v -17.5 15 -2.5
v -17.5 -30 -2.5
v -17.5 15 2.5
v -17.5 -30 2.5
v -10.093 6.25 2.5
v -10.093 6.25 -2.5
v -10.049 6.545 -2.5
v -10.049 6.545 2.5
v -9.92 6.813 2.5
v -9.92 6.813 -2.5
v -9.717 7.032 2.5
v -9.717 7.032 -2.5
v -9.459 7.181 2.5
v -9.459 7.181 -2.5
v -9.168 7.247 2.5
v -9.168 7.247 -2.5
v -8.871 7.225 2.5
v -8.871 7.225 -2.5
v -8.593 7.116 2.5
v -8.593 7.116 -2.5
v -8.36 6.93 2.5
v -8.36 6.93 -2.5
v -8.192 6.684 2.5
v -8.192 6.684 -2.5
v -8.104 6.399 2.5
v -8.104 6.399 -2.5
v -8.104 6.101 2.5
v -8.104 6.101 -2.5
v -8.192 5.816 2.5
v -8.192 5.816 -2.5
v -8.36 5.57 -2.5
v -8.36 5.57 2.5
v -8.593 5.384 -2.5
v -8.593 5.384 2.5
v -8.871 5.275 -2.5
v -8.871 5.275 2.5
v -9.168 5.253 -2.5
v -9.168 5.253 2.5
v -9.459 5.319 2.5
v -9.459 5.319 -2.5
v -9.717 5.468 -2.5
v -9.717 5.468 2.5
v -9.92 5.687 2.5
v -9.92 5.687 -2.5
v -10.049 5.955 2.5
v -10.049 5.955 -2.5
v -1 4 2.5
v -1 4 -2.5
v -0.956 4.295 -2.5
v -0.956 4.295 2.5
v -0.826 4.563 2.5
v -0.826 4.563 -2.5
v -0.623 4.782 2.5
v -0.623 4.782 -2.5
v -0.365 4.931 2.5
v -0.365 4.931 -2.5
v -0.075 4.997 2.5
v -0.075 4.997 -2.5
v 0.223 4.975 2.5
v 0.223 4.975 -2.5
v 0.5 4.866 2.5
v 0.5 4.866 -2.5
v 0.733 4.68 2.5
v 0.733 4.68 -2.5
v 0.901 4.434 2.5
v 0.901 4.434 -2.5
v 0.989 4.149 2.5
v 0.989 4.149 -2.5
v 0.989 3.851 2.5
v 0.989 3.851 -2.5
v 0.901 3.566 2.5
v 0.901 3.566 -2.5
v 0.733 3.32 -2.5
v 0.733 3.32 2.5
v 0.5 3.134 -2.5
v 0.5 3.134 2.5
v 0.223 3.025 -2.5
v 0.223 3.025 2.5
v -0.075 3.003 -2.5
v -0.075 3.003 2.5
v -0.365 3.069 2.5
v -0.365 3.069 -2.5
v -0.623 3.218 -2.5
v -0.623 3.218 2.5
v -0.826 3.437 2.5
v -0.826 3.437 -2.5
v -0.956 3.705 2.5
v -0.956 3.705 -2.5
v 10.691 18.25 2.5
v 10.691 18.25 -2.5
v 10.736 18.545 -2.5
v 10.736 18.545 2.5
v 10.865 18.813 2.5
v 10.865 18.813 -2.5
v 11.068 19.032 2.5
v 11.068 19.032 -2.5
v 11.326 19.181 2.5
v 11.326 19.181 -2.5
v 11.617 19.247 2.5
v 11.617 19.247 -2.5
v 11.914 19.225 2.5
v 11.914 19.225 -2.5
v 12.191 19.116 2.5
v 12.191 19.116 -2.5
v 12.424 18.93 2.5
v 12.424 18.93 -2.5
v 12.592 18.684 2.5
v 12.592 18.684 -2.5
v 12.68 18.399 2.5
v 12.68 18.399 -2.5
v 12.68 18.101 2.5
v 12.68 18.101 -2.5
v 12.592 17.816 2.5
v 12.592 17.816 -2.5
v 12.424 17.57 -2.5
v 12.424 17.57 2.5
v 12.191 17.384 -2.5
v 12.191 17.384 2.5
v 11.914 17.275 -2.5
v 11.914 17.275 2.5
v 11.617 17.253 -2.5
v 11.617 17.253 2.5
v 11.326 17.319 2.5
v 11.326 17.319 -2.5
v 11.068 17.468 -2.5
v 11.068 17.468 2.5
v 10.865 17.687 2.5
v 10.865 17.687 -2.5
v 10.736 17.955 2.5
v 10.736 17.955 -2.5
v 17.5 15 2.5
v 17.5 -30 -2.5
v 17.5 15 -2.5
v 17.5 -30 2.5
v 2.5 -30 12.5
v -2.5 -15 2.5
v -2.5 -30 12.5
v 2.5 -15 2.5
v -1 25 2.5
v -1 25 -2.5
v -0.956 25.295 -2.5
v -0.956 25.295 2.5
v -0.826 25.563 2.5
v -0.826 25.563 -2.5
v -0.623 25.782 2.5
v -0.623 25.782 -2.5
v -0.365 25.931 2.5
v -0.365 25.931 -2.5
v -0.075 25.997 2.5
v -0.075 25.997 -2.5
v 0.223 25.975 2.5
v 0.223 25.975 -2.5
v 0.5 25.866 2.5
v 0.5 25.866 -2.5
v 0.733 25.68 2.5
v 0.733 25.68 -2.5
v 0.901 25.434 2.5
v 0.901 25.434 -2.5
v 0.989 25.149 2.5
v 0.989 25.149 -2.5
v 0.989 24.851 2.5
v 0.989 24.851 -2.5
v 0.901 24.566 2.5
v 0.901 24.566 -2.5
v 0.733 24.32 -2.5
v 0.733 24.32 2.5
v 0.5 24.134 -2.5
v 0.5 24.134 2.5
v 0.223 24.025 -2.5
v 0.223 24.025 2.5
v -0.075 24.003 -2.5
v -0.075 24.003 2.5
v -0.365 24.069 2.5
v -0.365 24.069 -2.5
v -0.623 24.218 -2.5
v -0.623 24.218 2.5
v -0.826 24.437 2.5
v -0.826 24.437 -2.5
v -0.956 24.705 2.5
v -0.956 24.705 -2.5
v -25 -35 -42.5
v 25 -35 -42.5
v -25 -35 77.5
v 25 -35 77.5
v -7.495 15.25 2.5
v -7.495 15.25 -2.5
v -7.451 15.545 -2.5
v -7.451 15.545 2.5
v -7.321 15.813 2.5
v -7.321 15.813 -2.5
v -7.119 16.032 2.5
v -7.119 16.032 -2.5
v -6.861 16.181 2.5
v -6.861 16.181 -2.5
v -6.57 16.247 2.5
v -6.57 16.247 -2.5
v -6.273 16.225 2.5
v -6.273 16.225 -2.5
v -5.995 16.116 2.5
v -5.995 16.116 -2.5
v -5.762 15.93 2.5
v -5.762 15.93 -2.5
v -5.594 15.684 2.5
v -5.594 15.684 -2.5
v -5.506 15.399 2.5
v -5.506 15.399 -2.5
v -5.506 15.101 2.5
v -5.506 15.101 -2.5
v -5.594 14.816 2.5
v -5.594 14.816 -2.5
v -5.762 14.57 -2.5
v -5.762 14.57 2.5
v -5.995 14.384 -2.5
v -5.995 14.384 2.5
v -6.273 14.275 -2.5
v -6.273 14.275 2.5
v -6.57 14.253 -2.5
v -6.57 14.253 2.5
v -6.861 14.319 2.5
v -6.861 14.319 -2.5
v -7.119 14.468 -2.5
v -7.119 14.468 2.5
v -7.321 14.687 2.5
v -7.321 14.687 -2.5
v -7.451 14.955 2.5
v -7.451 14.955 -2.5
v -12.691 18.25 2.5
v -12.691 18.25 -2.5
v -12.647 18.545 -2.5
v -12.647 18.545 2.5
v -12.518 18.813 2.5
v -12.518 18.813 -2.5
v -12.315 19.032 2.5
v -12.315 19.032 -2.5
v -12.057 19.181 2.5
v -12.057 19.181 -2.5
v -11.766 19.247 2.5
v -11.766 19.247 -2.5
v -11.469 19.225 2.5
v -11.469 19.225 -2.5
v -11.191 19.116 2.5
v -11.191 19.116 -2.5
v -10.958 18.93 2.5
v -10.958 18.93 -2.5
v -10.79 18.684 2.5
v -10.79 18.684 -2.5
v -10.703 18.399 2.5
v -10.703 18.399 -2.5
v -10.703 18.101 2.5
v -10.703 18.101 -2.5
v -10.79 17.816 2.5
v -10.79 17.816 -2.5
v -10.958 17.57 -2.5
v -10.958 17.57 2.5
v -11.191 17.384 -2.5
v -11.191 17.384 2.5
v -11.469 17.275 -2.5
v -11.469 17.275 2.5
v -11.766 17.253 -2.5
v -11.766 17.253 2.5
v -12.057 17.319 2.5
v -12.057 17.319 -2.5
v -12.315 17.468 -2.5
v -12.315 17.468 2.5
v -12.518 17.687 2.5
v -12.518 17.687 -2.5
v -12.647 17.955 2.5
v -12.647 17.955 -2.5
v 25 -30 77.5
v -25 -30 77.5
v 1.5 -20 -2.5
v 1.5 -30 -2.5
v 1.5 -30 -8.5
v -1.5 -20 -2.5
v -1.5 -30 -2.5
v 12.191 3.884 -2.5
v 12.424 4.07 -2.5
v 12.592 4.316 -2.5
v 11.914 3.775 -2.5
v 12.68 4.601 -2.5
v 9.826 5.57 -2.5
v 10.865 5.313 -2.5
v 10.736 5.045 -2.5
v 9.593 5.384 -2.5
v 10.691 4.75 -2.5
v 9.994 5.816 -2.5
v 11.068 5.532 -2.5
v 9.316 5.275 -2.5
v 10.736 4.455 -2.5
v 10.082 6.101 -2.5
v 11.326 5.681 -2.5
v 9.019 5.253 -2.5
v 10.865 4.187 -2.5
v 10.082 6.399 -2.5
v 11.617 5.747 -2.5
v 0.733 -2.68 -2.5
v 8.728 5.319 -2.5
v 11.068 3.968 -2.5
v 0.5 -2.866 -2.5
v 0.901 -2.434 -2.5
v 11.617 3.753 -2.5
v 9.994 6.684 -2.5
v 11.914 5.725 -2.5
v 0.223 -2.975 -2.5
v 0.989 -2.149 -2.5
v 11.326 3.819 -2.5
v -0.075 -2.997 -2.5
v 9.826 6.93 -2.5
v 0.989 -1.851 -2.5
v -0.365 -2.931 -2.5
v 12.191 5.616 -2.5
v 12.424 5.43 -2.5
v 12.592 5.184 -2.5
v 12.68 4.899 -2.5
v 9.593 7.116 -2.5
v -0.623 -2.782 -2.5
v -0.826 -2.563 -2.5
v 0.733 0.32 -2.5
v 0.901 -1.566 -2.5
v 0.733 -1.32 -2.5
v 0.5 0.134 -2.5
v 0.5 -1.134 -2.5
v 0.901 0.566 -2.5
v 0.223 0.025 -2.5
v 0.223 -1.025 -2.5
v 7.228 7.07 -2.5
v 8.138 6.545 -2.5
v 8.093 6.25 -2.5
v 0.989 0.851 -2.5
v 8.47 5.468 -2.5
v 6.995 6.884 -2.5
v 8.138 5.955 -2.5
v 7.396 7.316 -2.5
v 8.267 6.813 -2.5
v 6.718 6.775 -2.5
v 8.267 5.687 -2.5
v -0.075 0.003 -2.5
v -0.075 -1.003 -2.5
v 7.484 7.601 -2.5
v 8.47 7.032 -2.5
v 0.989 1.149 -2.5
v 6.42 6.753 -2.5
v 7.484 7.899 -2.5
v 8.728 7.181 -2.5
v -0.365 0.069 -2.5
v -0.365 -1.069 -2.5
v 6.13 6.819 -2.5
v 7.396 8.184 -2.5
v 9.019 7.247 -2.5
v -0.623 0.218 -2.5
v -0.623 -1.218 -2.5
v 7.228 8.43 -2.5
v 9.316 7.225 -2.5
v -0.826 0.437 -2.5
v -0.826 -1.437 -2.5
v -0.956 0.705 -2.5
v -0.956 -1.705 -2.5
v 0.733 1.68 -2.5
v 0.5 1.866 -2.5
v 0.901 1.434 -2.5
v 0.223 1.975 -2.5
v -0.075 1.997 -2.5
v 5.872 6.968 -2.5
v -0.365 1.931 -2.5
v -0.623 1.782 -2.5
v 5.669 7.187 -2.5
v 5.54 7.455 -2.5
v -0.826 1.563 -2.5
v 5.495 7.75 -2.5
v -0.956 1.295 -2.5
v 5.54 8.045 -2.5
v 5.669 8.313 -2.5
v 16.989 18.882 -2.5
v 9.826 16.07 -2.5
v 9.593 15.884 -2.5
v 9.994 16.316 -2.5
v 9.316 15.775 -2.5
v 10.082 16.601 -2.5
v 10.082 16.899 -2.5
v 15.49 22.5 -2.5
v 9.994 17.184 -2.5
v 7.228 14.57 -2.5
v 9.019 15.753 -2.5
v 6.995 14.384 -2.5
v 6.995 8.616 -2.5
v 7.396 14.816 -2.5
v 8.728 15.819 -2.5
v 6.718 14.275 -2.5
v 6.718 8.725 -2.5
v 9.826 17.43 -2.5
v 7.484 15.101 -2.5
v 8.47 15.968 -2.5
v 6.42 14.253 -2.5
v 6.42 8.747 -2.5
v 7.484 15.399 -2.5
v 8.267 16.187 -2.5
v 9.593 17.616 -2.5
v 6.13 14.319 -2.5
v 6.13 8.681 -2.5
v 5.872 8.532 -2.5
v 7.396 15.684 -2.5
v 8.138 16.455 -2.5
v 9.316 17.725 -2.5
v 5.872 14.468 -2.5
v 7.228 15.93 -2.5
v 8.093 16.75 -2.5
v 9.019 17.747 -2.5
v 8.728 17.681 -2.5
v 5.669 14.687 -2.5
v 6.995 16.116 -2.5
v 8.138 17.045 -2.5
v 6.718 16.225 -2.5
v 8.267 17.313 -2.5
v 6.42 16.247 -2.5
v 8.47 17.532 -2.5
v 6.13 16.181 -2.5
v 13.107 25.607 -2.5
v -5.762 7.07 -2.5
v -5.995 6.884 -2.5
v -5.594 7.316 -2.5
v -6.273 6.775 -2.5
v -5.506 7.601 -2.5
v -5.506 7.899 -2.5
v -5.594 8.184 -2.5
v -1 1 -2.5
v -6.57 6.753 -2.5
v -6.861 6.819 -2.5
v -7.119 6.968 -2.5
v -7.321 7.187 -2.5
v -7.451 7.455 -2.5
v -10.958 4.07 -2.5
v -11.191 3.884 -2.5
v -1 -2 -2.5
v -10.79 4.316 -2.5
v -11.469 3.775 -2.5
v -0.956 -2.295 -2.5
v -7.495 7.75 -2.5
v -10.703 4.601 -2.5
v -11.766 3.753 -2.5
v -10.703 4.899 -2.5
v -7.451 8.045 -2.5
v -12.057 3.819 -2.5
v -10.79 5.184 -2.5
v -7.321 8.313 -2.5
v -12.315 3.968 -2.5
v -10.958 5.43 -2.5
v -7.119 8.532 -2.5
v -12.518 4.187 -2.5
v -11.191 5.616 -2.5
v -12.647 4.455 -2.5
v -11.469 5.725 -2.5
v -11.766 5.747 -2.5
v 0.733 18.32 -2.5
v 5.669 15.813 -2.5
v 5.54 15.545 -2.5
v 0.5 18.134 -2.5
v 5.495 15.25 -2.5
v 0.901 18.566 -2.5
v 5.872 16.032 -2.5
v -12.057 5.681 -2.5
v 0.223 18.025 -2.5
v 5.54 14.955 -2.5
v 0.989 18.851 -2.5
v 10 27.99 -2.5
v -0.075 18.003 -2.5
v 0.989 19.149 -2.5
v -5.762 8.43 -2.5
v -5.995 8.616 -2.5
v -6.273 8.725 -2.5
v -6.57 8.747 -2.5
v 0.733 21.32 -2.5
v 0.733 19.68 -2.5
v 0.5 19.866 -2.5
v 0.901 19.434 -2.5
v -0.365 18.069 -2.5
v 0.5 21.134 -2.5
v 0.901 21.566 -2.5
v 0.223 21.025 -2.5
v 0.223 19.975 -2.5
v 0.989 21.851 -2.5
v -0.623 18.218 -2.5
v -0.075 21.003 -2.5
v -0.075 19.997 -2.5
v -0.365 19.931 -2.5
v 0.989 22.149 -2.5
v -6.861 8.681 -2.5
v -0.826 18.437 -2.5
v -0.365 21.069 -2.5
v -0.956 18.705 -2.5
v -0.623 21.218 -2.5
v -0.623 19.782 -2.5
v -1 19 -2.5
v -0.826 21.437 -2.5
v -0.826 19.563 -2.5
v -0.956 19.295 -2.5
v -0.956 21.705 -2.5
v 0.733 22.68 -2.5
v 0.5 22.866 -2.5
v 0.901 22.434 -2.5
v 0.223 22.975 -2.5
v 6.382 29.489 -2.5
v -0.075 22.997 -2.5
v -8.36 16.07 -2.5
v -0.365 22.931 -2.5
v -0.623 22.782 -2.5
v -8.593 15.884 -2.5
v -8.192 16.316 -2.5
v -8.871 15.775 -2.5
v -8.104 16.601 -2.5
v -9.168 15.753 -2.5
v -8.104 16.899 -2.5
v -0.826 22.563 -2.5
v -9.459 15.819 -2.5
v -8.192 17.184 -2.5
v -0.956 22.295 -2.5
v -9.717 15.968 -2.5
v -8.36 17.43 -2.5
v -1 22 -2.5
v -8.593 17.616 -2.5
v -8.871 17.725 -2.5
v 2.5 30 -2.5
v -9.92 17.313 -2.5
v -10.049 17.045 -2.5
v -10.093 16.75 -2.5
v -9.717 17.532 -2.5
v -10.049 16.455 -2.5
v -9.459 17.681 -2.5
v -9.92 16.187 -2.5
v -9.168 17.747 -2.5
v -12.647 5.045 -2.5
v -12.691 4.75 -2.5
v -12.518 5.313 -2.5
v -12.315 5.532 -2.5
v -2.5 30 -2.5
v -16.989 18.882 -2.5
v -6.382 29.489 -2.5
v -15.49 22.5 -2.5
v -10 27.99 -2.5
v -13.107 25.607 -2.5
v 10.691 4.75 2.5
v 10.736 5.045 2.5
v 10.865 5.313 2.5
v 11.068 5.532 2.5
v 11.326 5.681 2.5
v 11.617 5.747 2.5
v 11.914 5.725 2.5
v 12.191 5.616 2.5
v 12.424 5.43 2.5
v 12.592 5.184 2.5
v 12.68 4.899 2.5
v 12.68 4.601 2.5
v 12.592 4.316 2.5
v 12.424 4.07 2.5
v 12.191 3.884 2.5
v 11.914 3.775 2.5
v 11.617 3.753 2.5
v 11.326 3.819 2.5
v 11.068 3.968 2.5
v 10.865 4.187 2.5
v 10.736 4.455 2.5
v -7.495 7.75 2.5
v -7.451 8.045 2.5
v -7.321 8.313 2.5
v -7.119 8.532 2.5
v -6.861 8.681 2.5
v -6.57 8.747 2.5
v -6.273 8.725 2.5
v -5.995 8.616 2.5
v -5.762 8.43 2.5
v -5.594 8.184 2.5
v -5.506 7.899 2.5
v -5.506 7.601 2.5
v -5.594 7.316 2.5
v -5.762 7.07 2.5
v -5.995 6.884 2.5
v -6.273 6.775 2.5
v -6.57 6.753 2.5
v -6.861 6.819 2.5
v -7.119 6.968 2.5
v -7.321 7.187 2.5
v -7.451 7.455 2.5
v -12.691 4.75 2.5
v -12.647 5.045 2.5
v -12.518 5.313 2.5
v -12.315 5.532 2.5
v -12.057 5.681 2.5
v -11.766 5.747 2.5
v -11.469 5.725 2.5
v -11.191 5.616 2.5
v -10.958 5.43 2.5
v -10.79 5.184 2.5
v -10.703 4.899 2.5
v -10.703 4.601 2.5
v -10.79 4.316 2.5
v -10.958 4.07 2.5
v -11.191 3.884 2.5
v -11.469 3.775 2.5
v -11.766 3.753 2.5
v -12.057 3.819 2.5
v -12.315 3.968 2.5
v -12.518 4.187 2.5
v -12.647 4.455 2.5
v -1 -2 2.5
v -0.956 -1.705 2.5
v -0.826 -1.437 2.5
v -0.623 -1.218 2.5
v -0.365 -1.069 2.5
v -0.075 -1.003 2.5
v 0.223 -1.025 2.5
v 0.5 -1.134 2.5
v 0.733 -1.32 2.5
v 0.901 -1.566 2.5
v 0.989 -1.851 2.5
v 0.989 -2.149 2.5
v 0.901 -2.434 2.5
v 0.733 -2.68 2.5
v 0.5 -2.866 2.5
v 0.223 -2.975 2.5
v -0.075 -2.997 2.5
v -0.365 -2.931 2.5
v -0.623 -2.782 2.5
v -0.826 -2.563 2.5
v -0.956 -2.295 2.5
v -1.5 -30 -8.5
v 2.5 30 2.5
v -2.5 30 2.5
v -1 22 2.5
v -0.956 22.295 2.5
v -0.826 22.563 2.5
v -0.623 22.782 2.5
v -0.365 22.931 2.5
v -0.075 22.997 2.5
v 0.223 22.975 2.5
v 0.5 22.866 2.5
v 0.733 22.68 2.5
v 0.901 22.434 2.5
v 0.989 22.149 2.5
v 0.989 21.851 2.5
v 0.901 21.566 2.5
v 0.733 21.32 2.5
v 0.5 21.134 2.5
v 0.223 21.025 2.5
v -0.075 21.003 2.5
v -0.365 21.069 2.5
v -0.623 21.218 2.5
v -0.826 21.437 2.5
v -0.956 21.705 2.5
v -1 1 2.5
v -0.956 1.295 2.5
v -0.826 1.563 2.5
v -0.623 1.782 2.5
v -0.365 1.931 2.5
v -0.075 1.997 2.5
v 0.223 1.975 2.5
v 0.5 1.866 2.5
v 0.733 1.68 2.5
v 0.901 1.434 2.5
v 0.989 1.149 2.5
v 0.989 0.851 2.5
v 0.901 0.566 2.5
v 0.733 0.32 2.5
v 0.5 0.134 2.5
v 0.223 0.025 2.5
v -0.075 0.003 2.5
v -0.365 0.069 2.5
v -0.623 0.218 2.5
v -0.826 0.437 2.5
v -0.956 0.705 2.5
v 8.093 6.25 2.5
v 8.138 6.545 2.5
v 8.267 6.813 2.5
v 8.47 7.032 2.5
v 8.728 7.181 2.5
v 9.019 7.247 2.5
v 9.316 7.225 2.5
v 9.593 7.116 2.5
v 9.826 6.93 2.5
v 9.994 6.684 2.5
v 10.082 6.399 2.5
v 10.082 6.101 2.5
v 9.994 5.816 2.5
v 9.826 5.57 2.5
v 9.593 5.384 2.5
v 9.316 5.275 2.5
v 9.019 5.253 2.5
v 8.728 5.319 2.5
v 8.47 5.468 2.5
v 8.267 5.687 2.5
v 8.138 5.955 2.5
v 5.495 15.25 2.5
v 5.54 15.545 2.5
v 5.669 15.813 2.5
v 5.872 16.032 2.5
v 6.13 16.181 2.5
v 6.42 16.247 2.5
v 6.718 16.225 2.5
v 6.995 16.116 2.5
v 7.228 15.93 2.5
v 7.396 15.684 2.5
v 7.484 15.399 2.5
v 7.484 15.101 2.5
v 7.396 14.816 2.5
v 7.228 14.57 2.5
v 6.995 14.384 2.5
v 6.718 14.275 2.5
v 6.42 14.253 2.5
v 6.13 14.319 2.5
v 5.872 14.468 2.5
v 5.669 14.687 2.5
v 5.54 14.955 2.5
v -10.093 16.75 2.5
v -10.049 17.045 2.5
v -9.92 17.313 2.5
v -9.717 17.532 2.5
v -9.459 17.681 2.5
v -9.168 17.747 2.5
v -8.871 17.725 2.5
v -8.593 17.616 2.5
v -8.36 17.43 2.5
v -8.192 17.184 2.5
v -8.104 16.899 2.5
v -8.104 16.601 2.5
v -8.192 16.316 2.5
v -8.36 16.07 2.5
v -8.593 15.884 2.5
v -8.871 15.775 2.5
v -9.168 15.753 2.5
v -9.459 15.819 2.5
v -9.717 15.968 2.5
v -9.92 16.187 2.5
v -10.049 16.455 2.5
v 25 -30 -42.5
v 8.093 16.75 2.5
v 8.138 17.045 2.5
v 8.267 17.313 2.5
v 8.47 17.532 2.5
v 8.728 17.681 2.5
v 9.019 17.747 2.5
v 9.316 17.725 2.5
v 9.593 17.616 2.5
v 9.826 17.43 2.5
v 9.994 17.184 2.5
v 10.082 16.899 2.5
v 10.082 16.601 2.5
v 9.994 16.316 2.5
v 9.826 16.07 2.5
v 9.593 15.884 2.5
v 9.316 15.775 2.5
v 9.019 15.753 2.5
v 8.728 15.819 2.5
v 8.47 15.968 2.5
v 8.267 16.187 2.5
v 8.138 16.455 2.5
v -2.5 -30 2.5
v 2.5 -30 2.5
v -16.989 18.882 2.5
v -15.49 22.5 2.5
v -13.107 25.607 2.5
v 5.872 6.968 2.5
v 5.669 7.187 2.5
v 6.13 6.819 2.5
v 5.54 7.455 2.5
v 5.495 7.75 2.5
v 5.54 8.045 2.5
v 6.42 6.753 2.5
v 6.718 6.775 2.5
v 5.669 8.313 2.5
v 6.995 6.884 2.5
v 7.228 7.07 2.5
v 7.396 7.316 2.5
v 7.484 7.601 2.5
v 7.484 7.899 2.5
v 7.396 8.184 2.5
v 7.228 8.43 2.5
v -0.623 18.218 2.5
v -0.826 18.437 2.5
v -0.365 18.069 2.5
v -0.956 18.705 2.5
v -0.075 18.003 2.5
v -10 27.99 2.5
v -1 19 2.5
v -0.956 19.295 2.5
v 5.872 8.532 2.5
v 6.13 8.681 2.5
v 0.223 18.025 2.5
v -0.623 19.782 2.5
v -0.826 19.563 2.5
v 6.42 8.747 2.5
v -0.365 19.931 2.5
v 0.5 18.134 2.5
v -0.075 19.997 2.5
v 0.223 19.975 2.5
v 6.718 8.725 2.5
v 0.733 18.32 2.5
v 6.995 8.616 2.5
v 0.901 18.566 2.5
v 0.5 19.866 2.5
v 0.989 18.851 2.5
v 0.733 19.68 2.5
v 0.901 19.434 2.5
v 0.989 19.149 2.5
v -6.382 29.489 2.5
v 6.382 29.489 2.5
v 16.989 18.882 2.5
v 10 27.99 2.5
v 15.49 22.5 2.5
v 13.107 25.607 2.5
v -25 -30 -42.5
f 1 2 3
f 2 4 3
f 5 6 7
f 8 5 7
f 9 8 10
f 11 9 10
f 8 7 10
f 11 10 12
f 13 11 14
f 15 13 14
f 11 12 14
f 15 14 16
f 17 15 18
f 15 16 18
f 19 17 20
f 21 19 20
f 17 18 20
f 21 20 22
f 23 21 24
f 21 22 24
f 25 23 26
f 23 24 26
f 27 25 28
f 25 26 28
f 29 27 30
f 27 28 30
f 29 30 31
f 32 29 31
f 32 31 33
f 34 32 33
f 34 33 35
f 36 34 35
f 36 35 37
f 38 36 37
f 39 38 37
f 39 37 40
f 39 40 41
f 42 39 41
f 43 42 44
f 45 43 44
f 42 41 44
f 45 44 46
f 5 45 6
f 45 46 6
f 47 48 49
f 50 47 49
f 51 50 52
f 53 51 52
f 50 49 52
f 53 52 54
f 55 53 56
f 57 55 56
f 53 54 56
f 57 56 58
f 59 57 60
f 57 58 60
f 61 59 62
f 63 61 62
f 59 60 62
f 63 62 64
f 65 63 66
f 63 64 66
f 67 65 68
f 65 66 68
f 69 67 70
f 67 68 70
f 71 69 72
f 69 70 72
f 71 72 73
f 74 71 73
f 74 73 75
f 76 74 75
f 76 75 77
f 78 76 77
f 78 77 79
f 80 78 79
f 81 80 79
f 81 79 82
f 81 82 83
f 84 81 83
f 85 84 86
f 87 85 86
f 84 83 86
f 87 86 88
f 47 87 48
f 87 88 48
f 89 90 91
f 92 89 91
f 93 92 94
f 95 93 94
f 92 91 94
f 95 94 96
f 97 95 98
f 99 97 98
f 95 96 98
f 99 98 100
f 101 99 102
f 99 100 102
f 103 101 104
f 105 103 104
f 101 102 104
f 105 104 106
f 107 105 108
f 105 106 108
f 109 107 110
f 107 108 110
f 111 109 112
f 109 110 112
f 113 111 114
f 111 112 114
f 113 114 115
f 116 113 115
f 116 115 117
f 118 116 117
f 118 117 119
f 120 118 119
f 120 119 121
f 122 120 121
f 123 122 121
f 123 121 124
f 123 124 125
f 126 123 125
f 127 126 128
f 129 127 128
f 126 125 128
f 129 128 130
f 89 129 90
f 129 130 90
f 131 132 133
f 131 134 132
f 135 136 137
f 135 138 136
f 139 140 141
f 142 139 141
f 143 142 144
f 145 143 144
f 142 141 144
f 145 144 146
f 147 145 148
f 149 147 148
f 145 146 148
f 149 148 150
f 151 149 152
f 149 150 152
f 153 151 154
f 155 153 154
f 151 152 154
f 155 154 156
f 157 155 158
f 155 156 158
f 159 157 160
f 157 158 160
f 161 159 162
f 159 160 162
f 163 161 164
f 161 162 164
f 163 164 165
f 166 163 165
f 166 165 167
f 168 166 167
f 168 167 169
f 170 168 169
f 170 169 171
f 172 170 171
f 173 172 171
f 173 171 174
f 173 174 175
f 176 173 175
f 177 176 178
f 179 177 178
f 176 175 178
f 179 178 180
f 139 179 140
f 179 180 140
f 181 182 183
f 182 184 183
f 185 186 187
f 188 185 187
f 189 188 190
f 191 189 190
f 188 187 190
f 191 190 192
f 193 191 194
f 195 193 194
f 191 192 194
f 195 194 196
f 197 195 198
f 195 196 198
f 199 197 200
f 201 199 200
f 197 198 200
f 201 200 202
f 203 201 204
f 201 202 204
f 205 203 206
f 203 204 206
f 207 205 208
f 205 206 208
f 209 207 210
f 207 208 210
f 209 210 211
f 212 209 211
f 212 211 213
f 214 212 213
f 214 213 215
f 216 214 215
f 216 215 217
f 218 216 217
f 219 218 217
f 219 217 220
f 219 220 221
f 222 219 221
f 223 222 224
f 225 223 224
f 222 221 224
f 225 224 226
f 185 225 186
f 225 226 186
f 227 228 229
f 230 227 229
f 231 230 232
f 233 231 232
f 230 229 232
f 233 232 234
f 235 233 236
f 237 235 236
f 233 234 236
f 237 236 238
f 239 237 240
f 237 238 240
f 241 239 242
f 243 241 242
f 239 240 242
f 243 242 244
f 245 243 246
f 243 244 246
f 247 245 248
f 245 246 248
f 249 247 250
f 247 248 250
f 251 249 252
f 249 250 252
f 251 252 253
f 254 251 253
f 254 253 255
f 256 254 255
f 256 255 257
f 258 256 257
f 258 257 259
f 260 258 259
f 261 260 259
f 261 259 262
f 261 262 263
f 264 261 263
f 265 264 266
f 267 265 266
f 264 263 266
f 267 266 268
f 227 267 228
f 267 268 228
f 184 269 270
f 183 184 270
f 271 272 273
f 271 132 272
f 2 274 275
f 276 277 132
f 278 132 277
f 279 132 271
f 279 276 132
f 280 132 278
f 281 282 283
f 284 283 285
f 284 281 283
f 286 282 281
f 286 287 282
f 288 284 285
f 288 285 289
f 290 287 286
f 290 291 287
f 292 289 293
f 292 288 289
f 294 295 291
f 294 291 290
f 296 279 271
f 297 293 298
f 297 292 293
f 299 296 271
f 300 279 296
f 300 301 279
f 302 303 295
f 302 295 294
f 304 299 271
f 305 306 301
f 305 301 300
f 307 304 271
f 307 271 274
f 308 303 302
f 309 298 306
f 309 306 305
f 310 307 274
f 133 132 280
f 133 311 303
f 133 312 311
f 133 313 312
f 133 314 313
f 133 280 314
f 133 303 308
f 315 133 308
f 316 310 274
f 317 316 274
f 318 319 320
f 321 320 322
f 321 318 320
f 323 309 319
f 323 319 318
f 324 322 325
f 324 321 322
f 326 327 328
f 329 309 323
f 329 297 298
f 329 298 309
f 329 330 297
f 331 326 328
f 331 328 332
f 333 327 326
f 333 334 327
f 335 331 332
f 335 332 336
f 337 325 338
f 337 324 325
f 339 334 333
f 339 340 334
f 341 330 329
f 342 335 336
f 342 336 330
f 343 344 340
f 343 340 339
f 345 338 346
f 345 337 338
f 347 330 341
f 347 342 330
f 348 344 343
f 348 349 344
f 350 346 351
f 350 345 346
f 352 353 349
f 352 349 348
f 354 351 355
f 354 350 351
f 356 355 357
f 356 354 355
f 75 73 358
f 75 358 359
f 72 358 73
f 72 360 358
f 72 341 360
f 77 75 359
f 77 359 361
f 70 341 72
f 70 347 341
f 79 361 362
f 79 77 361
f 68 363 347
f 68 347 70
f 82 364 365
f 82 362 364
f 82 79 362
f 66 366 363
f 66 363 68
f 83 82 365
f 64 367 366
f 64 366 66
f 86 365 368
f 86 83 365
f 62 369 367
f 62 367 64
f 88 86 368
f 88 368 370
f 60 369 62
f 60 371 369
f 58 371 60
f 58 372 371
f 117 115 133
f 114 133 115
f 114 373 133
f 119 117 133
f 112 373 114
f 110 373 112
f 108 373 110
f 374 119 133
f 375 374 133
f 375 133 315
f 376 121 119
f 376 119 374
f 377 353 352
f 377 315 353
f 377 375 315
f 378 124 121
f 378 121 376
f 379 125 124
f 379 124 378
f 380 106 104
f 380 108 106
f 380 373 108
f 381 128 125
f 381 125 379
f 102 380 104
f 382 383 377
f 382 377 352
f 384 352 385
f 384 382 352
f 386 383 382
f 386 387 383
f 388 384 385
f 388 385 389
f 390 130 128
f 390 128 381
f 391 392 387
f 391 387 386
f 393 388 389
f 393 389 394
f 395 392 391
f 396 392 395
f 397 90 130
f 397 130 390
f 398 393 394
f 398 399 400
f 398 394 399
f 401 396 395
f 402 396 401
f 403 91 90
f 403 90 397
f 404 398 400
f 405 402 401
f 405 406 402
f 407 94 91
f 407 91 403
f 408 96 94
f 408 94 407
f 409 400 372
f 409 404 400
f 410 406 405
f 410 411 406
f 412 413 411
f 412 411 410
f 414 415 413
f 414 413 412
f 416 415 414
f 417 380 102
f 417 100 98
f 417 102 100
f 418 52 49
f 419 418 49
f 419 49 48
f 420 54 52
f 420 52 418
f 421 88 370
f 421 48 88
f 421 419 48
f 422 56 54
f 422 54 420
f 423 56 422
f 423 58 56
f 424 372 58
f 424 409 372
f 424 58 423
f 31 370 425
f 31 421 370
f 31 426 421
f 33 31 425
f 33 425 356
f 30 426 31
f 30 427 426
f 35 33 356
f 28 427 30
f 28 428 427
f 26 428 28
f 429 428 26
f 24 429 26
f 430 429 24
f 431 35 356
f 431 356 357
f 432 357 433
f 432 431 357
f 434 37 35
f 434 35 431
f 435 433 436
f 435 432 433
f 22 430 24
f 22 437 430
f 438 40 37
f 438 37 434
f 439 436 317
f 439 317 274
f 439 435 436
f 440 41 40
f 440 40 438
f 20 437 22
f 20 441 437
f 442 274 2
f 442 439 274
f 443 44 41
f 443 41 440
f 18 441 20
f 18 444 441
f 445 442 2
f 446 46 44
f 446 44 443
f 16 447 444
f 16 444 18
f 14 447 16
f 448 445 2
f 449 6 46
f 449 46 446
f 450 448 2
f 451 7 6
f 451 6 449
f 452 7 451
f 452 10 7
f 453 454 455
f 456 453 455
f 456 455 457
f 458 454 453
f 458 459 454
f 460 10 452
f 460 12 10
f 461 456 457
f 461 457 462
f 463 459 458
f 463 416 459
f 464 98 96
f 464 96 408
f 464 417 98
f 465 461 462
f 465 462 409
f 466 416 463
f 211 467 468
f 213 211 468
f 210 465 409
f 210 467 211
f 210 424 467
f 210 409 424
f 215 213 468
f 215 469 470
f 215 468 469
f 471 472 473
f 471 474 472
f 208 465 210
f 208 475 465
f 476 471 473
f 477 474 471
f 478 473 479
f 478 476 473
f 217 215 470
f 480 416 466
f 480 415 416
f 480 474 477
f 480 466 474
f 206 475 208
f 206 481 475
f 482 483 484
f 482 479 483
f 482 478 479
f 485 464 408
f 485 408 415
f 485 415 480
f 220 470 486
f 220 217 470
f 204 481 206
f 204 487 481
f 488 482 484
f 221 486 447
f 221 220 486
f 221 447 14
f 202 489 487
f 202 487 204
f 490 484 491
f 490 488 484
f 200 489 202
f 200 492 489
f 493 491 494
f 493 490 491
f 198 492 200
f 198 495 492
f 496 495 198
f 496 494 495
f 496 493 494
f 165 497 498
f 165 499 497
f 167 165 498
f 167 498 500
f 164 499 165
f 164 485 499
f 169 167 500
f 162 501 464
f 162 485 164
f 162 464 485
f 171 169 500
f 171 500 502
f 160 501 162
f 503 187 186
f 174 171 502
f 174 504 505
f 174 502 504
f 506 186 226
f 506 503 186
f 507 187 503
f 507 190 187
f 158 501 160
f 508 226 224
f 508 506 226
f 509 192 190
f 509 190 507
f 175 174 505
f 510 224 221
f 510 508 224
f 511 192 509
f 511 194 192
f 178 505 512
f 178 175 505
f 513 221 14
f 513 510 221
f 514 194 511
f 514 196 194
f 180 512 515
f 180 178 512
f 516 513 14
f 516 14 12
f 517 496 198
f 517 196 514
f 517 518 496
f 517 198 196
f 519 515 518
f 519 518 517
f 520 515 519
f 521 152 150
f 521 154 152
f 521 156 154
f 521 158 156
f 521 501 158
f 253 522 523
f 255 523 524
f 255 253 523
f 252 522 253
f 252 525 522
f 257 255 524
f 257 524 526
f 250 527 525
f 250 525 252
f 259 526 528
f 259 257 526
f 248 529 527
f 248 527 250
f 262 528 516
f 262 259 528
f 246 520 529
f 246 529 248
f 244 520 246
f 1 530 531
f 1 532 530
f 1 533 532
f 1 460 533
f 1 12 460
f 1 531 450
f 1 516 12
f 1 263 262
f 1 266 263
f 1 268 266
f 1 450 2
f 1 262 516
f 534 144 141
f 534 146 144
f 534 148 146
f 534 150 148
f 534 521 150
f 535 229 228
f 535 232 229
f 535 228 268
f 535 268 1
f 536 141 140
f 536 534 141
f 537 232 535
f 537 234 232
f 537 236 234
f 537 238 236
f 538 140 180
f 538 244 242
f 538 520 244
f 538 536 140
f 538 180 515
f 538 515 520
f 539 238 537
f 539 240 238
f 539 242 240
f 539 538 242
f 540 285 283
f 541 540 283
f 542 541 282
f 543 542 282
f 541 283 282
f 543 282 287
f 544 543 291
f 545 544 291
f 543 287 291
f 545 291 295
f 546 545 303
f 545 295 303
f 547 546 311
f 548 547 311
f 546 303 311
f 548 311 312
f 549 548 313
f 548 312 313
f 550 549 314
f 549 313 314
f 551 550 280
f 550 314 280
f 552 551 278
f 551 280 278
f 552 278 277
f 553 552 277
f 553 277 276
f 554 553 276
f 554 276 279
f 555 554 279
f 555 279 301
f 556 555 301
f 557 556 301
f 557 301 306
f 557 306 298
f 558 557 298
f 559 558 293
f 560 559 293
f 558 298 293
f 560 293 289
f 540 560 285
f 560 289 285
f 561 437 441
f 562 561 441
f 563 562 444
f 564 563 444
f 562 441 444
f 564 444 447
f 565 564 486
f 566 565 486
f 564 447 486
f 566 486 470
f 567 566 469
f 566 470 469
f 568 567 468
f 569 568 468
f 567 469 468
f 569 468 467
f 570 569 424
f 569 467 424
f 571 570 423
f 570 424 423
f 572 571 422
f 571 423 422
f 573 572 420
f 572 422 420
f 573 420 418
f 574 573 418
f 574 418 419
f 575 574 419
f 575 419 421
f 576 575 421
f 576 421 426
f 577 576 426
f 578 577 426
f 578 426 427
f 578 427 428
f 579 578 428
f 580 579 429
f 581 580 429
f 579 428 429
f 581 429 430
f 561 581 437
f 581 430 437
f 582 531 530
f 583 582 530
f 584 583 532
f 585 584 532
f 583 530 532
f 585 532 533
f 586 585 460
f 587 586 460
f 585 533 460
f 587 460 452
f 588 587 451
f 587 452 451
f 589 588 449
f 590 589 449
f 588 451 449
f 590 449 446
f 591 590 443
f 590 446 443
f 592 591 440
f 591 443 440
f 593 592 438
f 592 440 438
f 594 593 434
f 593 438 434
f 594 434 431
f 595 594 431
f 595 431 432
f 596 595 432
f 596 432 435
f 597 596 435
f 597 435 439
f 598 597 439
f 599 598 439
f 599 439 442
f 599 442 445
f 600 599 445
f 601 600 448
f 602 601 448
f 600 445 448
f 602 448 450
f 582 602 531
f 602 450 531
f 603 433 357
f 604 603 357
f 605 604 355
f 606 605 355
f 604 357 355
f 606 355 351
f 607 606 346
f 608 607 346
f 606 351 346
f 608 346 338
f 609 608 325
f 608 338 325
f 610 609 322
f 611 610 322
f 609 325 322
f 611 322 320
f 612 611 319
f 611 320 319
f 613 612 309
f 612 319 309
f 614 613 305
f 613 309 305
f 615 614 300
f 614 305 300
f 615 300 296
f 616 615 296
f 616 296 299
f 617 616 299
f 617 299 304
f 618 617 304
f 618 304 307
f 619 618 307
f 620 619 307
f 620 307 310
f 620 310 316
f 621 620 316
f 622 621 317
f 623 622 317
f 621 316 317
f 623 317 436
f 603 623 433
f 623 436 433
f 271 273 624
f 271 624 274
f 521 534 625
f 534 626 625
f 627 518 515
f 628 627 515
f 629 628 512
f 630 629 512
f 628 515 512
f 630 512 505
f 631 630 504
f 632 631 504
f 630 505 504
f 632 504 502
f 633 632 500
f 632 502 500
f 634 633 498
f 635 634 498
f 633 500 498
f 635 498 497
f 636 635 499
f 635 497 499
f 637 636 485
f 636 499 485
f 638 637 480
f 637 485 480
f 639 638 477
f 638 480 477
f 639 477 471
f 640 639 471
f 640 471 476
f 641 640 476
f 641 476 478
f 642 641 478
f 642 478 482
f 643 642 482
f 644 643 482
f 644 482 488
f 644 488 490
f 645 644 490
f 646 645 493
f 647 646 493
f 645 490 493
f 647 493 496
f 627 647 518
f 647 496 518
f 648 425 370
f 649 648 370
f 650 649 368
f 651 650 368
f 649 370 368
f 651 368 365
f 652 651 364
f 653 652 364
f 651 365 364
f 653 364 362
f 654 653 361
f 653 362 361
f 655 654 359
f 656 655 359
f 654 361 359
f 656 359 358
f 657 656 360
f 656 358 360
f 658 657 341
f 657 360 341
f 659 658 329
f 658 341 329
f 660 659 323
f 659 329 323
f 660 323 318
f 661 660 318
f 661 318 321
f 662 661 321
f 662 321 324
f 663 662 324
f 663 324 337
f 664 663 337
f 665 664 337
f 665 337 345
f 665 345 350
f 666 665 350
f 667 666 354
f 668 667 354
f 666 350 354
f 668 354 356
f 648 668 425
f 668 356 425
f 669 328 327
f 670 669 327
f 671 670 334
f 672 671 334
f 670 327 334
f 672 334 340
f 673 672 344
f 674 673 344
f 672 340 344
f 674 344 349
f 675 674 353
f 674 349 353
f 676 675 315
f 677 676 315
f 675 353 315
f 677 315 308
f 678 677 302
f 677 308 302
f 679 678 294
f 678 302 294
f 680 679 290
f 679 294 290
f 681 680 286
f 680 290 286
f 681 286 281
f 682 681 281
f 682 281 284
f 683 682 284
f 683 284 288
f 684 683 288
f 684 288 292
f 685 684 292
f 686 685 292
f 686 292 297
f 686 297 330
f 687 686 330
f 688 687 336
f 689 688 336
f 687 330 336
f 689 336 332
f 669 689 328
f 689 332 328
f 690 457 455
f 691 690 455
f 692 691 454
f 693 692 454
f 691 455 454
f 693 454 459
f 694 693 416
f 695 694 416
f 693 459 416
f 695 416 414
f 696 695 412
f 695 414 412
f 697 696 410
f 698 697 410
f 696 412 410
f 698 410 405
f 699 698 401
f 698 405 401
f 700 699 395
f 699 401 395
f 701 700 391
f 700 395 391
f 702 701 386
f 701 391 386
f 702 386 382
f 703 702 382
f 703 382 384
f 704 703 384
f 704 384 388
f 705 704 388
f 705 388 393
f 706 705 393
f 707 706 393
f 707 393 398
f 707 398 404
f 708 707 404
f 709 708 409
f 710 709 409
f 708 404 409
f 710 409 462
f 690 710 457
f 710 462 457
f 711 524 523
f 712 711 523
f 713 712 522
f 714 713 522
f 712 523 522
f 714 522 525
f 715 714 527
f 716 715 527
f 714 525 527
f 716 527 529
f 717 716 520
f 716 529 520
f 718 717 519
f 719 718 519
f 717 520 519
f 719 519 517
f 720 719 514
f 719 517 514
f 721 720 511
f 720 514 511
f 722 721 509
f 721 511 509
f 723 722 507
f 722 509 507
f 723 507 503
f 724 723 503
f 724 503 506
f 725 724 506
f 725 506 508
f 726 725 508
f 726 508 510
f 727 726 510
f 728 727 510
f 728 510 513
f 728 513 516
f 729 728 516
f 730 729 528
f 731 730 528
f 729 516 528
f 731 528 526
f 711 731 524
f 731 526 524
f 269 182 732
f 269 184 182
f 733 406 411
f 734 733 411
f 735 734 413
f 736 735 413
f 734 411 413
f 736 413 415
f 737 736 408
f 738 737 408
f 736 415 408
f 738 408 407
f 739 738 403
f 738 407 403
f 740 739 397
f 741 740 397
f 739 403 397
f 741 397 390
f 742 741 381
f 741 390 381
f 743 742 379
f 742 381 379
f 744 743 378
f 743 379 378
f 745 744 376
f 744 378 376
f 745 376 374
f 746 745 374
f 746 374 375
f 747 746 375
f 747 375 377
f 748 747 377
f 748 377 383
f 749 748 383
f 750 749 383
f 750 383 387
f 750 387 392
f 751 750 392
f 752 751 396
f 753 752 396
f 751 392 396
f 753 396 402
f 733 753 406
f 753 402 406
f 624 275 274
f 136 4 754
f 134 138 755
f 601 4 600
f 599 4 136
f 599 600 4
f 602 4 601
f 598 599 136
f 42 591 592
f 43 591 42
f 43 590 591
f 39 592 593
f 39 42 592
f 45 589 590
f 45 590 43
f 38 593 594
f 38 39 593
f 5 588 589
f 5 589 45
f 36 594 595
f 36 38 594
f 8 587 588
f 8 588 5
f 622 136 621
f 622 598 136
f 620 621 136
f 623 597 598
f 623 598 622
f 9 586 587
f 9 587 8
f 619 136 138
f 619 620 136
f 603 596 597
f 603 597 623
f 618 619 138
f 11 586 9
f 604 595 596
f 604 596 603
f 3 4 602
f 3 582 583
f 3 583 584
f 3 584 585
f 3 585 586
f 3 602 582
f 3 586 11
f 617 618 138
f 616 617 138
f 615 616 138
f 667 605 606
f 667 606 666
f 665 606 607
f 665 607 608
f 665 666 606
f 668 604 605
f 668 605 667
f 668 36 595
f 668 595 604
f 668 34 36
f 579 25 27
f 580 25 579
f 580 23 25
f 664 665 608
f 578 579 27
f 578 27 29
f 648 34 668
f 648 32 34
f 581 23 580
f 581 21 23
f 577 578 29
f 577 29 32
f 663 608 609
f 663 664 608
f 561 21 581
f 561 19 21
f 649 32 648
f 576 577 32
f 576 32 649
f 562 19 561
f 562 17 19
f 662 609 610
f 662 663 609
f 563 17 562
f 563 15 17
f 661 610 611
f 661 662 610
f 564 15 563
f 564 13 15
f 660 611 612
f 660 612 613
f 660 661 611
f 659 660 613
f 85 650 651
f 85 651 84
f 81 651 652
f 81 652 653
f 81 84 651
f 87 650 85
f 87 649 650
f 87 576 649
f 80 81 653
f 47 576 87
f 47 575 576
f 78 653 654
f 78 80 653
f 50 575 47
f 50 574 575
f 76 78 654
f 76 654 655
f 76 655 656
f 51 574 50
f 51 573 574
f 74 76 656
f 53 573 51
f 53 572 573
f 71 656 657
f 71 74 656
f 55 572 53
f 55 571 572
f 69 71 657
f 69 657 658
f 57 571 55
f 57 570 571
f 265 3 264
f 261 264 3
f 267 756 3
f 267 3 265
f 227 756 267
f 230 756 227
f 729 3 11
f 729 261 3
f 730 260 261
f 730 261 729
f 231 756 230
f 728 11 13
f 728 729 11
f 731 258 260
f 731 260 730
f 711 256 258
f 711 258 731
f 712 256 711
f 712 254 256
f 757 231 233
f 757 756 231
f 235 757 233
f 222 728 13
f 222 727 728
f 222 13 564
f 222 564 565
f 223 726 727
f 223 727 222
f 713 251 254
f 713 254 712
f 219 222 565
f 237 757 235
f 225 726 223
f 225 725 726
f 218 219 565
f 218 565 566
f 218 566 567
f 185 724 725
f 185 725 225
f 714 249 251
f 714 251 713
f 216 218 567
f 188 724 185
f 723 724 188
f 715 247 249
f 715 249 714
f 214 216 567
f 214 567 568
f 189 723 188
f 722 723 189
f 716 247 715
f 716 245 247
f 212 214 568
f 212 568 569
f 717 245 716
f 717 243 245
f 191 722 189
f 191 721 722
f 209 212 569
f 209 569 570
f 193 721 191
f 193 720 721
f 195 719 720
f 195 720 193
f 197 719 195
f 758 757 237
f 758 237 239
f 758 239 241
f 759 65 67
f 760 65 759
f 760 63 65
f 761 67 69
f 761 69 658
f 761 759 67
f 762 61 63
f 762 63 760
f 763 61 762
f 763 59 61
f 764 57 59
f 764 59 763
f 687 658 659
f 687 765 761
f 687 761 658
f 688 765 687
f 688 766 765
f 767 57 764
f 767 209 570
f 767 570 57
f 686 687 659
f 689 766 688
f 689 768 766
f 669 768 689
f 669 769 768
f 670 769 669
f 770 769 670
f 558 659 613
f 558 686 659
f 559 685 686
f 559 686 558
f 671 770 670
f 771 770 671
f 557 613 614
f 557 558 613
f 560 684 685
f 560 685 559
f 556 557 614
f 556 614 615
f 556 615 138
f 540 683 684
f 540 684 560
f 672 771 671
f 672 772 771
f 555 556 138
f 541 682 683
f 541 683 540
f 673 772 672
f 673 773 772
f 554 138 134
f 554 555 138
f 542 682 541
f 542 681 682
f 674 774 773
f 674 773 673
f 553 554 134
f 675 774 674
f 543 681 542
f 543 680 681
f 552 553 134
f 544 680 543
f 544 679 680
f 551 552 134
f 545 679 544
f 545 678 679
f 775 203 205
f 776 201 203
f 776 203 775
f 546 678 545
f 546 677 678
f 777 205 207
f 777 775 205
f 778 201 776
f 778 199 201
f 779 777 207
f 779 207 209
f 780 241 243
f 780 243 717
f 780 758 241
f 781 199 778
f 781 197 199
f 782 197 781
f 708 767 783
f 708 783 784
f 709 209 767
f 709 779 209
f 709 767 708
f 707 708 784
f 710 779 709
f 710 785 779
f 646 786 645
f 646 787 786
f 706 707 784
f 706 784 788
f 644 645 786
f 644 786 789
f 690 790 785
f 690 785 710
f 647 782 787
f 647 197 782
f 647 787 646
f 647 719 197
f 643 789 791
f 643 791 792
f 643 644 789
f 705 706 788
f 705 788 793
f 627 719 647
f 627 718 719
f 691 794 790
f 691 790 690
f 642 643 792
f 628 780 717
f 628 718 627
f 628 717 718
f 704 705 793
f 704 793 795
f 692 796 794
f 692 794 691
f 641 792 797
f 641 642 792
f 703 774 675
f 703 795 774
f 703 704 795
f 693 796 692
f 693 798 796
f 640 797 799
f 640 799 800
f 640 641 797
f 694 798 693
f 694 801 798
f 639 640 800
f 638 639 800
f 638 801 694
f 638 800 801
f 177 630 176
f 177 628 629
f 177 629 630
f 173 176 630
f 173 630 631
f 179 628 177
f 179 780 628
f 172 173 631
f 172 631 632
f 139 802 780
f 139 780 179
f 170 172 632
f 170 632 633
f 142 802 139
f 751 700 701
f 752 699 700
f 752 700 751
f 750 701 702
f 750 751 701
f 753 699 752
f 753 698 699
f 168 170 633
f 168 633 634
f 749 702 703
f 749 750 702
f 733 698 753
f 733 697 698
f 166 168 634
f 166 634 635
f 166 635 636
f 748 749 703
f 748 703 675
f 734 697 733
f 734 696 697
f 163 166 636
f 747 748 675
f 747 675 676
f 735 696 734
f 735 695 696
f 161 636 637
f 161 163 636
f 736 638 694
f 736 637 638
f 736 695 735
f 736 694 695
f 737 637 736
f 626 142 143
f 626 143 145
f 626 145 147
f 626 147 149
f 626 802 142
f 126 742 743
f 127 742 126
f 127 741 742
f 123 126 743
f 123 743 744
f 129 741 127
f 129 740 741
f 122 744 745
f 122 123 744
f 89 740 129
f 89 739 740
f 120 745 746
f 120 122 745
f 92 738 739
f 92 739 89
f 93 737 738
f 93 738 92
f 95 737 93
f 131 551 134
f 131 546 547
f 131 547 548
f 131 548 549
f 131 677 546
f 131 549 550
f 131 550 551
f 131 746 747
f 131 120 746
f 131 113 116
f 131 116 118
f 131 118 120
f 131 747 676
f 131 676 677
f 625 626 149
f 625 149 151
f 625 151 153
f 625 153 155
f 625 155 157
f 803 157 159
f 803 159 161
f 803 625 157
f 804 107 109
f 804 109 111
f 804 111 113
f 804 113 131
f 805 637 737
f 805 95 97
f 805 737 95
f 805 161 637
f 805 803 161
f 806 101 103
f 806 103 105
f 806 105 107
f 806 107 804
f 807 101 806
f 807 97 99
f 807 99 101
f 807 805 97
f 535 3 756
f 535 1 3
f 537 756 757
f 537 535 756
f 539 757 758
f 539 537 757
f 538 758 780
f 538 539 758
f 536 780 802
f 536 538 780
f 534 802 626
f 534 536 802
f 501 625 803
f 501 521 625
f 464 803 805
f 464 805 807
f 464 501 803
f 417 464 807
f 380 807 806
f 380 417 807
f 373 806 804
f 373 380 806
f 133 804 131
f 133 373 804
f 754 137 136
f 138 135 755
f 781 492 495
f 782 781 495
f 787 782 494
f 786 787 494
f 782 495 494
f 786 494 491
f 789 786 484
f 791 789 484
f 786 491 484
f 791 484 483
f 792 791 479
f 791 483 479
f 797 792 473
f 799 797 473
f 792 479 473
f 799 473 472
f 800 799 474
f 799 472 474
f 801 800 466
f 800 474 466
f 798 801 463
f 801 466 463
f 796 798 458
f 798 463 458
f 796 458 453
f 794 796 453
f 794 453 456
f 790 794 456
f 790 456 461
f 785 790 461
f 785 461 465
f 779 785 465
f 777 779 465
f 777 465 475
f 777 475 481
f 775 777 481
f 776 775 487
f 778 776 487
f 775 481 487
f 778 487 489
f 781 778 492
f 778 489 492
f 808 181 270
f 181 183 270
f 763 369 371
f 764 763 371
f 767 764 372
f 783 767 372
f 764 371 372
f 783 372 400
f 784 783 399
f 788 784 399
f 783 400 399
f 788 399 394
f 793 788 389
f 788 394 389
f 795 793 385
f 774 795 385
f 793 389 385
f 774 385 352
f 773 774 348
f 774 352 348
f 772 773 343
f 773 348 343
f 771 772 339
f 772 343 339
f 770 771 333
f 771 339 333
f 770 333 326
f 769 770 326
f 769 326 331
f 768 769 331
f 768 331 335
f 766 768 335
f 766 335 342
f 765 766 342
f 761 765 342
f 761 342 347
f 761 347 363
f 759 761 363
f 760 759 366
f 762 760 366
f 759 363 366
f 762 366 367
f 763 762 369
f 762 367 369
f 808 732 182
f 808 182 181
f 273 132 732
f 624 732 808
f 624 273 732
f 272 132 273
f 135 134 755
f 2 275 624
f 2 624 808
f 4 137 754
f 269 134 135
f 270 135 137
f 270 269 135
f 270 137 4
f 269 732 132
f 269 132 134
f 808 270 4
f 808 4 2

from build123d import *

# Parameters (mm, degrees)
SKETCH1_W           = 35
SKETCH1_H           = 60
BOSS_EXTRUDE1_DEPTH = 2.5
SKETCH2_R           = 1
CUT_EXTRUDE1_DEPTH  = 5
FILLET1_R           = 15
SKETCH3_W           = 50
SKETCH3_H           = 5
BOSS_EXTRUDE2_DEPTH = 80
BOSS_EXTRUDE3_DEPTH = 2.5
SKETCH5_W           = 50
SKETCH5_H           = 5
BOSS_EXTRUDE4_DEPTH = 40
BOSS_EXTRUDE5_DEPTH = 1.5


with BuildPart() as part:
    # Sketch1 → Boss-Extrude1 (new, symmetric)
    with BuildSketch(Plane.XY):
        Rectangle(SKETCH1_W, SKETCH1_H)
    extrude(amount=BOSS_EXTRUDE1_DEPTH, both=True)

    # Sketch2 → Cut-Extrude1 (cut)
    with BuildSketch(Plane(origin=(0, 0, -2.5), x_dir=(-1, 0, 0), z_dir=(0, 0, -1))):
        with Locations((0, 25)):
            Circle(SKETCH2_R)
        with Locations((0, 22)):
            Circle(SKETCH2_R)
        with Locations((0, 19)):
            Circle(SKETCH2_R)
        with Locations((11.691342951, 18.25)):
            Circle(SKETCH2_R)
        with Locations((9.09326674, 16.75)):
            Circle(SKETCH2_R)
        with Locations((6.495190528, 15.25)):
            Circle(SKETCH2_R)
        with Locations((11.691342951, 4.75)):
            Circle(SKETCH2_R)
        with Locations((9.09326674, 6.25)):
            Circle(SKETCH2_R)
        with Locations((6.495190528, 7.75)):
            Circle(SKETCH2_R)
        with Locations((0, -2)):
            Circle(SKETCH2_R)
        with Locations((0, 1)):
            Circle(SKETCH2_R)
        with Locations((0, 4)):
            Circle(SKETCH2_R)
        with Locations((-11.691342951, 4.75)):
            Circle(SKETCH2_R)
        with Locations((-9.09326674, 6.25)):
            Circle(SKETCH2_R)
        with Locations((-6.495190528, 7.75)):
            Circle(SKETCH2_R)
        with Locations((-11.691342951, 18.25)):
            Circle(SKETCH2_R)
        with Locations((-9.09326674, 16.75)):
            Circle(SKETCH2_R)
        with Locations((-6.495190528, 15.25)):
            Circle(SKETCH2_R)
    extrude(amount=-CUT_EXTRUDE1_DEPTH, mode=Mode.SUBTRACT)

    # Fillet1
    fillet1_edges = [part.edges().sort_by_distance(p)[0] for p in [
        (-17.5, 30, 0),
        (17.5, 30, 0),
    ]]
    fillet(fillet1_edges, radius=FILLET1_R)

    # Sketch3 → Boss-Extrude2 (add)
    with BuildSketch(Plane(origin=(0, 0, -2.5), x_dir=(-1, 0, 0), z_dir=(0, 0, -1))):
        with Locations((0, -32.5)):
            Rectangle(SKETCH3_W, SKETCH3_H)
    extrude(amount=-BOSS_EXTRUDE2_DEPTH)

    # Sketch4 → Boss-Extrude3 (add, symmetric)
    with BuildSketch(Plane(origin=(0, 0, 0), x_dir=(0, 0, -1), z_dir=(1, 0, 0))):
        Polygon((-12.5, -30), (-2.5, -30), (-2.5, -15), align=None)
    extrude(amount=BOSS_EXTRUDE3_DEPTH, both=True)

    # Sketch5 → Boss-Extrude4 (add)
    with BuildSketch(Plane(origin=(0, 0, -2.5), x_dir=(-1, 0, 0), z_dir=(0, 0, -1))):
        with Locations((0, -32.5)):
            Rectangle(SKETCH5_W, SKETCH5_H)
    extrude(amount=BOSS_EXTRUDE4_DEPTH)

    # Sketch6 → Boss-Extrude5 (add, symmetric)
    with BuildSketch(Plane(origin=(0, 0, 0), x_dir=(0, 0, -1), z_dir=(1, 0, 0))):
        Polygon((2.5, -30), (8.5, -30), (2.5, -20), align=None)
    extrude(amount=BOSS_EXTRUDE5_DEPTH, both=True)


solid = part.part
